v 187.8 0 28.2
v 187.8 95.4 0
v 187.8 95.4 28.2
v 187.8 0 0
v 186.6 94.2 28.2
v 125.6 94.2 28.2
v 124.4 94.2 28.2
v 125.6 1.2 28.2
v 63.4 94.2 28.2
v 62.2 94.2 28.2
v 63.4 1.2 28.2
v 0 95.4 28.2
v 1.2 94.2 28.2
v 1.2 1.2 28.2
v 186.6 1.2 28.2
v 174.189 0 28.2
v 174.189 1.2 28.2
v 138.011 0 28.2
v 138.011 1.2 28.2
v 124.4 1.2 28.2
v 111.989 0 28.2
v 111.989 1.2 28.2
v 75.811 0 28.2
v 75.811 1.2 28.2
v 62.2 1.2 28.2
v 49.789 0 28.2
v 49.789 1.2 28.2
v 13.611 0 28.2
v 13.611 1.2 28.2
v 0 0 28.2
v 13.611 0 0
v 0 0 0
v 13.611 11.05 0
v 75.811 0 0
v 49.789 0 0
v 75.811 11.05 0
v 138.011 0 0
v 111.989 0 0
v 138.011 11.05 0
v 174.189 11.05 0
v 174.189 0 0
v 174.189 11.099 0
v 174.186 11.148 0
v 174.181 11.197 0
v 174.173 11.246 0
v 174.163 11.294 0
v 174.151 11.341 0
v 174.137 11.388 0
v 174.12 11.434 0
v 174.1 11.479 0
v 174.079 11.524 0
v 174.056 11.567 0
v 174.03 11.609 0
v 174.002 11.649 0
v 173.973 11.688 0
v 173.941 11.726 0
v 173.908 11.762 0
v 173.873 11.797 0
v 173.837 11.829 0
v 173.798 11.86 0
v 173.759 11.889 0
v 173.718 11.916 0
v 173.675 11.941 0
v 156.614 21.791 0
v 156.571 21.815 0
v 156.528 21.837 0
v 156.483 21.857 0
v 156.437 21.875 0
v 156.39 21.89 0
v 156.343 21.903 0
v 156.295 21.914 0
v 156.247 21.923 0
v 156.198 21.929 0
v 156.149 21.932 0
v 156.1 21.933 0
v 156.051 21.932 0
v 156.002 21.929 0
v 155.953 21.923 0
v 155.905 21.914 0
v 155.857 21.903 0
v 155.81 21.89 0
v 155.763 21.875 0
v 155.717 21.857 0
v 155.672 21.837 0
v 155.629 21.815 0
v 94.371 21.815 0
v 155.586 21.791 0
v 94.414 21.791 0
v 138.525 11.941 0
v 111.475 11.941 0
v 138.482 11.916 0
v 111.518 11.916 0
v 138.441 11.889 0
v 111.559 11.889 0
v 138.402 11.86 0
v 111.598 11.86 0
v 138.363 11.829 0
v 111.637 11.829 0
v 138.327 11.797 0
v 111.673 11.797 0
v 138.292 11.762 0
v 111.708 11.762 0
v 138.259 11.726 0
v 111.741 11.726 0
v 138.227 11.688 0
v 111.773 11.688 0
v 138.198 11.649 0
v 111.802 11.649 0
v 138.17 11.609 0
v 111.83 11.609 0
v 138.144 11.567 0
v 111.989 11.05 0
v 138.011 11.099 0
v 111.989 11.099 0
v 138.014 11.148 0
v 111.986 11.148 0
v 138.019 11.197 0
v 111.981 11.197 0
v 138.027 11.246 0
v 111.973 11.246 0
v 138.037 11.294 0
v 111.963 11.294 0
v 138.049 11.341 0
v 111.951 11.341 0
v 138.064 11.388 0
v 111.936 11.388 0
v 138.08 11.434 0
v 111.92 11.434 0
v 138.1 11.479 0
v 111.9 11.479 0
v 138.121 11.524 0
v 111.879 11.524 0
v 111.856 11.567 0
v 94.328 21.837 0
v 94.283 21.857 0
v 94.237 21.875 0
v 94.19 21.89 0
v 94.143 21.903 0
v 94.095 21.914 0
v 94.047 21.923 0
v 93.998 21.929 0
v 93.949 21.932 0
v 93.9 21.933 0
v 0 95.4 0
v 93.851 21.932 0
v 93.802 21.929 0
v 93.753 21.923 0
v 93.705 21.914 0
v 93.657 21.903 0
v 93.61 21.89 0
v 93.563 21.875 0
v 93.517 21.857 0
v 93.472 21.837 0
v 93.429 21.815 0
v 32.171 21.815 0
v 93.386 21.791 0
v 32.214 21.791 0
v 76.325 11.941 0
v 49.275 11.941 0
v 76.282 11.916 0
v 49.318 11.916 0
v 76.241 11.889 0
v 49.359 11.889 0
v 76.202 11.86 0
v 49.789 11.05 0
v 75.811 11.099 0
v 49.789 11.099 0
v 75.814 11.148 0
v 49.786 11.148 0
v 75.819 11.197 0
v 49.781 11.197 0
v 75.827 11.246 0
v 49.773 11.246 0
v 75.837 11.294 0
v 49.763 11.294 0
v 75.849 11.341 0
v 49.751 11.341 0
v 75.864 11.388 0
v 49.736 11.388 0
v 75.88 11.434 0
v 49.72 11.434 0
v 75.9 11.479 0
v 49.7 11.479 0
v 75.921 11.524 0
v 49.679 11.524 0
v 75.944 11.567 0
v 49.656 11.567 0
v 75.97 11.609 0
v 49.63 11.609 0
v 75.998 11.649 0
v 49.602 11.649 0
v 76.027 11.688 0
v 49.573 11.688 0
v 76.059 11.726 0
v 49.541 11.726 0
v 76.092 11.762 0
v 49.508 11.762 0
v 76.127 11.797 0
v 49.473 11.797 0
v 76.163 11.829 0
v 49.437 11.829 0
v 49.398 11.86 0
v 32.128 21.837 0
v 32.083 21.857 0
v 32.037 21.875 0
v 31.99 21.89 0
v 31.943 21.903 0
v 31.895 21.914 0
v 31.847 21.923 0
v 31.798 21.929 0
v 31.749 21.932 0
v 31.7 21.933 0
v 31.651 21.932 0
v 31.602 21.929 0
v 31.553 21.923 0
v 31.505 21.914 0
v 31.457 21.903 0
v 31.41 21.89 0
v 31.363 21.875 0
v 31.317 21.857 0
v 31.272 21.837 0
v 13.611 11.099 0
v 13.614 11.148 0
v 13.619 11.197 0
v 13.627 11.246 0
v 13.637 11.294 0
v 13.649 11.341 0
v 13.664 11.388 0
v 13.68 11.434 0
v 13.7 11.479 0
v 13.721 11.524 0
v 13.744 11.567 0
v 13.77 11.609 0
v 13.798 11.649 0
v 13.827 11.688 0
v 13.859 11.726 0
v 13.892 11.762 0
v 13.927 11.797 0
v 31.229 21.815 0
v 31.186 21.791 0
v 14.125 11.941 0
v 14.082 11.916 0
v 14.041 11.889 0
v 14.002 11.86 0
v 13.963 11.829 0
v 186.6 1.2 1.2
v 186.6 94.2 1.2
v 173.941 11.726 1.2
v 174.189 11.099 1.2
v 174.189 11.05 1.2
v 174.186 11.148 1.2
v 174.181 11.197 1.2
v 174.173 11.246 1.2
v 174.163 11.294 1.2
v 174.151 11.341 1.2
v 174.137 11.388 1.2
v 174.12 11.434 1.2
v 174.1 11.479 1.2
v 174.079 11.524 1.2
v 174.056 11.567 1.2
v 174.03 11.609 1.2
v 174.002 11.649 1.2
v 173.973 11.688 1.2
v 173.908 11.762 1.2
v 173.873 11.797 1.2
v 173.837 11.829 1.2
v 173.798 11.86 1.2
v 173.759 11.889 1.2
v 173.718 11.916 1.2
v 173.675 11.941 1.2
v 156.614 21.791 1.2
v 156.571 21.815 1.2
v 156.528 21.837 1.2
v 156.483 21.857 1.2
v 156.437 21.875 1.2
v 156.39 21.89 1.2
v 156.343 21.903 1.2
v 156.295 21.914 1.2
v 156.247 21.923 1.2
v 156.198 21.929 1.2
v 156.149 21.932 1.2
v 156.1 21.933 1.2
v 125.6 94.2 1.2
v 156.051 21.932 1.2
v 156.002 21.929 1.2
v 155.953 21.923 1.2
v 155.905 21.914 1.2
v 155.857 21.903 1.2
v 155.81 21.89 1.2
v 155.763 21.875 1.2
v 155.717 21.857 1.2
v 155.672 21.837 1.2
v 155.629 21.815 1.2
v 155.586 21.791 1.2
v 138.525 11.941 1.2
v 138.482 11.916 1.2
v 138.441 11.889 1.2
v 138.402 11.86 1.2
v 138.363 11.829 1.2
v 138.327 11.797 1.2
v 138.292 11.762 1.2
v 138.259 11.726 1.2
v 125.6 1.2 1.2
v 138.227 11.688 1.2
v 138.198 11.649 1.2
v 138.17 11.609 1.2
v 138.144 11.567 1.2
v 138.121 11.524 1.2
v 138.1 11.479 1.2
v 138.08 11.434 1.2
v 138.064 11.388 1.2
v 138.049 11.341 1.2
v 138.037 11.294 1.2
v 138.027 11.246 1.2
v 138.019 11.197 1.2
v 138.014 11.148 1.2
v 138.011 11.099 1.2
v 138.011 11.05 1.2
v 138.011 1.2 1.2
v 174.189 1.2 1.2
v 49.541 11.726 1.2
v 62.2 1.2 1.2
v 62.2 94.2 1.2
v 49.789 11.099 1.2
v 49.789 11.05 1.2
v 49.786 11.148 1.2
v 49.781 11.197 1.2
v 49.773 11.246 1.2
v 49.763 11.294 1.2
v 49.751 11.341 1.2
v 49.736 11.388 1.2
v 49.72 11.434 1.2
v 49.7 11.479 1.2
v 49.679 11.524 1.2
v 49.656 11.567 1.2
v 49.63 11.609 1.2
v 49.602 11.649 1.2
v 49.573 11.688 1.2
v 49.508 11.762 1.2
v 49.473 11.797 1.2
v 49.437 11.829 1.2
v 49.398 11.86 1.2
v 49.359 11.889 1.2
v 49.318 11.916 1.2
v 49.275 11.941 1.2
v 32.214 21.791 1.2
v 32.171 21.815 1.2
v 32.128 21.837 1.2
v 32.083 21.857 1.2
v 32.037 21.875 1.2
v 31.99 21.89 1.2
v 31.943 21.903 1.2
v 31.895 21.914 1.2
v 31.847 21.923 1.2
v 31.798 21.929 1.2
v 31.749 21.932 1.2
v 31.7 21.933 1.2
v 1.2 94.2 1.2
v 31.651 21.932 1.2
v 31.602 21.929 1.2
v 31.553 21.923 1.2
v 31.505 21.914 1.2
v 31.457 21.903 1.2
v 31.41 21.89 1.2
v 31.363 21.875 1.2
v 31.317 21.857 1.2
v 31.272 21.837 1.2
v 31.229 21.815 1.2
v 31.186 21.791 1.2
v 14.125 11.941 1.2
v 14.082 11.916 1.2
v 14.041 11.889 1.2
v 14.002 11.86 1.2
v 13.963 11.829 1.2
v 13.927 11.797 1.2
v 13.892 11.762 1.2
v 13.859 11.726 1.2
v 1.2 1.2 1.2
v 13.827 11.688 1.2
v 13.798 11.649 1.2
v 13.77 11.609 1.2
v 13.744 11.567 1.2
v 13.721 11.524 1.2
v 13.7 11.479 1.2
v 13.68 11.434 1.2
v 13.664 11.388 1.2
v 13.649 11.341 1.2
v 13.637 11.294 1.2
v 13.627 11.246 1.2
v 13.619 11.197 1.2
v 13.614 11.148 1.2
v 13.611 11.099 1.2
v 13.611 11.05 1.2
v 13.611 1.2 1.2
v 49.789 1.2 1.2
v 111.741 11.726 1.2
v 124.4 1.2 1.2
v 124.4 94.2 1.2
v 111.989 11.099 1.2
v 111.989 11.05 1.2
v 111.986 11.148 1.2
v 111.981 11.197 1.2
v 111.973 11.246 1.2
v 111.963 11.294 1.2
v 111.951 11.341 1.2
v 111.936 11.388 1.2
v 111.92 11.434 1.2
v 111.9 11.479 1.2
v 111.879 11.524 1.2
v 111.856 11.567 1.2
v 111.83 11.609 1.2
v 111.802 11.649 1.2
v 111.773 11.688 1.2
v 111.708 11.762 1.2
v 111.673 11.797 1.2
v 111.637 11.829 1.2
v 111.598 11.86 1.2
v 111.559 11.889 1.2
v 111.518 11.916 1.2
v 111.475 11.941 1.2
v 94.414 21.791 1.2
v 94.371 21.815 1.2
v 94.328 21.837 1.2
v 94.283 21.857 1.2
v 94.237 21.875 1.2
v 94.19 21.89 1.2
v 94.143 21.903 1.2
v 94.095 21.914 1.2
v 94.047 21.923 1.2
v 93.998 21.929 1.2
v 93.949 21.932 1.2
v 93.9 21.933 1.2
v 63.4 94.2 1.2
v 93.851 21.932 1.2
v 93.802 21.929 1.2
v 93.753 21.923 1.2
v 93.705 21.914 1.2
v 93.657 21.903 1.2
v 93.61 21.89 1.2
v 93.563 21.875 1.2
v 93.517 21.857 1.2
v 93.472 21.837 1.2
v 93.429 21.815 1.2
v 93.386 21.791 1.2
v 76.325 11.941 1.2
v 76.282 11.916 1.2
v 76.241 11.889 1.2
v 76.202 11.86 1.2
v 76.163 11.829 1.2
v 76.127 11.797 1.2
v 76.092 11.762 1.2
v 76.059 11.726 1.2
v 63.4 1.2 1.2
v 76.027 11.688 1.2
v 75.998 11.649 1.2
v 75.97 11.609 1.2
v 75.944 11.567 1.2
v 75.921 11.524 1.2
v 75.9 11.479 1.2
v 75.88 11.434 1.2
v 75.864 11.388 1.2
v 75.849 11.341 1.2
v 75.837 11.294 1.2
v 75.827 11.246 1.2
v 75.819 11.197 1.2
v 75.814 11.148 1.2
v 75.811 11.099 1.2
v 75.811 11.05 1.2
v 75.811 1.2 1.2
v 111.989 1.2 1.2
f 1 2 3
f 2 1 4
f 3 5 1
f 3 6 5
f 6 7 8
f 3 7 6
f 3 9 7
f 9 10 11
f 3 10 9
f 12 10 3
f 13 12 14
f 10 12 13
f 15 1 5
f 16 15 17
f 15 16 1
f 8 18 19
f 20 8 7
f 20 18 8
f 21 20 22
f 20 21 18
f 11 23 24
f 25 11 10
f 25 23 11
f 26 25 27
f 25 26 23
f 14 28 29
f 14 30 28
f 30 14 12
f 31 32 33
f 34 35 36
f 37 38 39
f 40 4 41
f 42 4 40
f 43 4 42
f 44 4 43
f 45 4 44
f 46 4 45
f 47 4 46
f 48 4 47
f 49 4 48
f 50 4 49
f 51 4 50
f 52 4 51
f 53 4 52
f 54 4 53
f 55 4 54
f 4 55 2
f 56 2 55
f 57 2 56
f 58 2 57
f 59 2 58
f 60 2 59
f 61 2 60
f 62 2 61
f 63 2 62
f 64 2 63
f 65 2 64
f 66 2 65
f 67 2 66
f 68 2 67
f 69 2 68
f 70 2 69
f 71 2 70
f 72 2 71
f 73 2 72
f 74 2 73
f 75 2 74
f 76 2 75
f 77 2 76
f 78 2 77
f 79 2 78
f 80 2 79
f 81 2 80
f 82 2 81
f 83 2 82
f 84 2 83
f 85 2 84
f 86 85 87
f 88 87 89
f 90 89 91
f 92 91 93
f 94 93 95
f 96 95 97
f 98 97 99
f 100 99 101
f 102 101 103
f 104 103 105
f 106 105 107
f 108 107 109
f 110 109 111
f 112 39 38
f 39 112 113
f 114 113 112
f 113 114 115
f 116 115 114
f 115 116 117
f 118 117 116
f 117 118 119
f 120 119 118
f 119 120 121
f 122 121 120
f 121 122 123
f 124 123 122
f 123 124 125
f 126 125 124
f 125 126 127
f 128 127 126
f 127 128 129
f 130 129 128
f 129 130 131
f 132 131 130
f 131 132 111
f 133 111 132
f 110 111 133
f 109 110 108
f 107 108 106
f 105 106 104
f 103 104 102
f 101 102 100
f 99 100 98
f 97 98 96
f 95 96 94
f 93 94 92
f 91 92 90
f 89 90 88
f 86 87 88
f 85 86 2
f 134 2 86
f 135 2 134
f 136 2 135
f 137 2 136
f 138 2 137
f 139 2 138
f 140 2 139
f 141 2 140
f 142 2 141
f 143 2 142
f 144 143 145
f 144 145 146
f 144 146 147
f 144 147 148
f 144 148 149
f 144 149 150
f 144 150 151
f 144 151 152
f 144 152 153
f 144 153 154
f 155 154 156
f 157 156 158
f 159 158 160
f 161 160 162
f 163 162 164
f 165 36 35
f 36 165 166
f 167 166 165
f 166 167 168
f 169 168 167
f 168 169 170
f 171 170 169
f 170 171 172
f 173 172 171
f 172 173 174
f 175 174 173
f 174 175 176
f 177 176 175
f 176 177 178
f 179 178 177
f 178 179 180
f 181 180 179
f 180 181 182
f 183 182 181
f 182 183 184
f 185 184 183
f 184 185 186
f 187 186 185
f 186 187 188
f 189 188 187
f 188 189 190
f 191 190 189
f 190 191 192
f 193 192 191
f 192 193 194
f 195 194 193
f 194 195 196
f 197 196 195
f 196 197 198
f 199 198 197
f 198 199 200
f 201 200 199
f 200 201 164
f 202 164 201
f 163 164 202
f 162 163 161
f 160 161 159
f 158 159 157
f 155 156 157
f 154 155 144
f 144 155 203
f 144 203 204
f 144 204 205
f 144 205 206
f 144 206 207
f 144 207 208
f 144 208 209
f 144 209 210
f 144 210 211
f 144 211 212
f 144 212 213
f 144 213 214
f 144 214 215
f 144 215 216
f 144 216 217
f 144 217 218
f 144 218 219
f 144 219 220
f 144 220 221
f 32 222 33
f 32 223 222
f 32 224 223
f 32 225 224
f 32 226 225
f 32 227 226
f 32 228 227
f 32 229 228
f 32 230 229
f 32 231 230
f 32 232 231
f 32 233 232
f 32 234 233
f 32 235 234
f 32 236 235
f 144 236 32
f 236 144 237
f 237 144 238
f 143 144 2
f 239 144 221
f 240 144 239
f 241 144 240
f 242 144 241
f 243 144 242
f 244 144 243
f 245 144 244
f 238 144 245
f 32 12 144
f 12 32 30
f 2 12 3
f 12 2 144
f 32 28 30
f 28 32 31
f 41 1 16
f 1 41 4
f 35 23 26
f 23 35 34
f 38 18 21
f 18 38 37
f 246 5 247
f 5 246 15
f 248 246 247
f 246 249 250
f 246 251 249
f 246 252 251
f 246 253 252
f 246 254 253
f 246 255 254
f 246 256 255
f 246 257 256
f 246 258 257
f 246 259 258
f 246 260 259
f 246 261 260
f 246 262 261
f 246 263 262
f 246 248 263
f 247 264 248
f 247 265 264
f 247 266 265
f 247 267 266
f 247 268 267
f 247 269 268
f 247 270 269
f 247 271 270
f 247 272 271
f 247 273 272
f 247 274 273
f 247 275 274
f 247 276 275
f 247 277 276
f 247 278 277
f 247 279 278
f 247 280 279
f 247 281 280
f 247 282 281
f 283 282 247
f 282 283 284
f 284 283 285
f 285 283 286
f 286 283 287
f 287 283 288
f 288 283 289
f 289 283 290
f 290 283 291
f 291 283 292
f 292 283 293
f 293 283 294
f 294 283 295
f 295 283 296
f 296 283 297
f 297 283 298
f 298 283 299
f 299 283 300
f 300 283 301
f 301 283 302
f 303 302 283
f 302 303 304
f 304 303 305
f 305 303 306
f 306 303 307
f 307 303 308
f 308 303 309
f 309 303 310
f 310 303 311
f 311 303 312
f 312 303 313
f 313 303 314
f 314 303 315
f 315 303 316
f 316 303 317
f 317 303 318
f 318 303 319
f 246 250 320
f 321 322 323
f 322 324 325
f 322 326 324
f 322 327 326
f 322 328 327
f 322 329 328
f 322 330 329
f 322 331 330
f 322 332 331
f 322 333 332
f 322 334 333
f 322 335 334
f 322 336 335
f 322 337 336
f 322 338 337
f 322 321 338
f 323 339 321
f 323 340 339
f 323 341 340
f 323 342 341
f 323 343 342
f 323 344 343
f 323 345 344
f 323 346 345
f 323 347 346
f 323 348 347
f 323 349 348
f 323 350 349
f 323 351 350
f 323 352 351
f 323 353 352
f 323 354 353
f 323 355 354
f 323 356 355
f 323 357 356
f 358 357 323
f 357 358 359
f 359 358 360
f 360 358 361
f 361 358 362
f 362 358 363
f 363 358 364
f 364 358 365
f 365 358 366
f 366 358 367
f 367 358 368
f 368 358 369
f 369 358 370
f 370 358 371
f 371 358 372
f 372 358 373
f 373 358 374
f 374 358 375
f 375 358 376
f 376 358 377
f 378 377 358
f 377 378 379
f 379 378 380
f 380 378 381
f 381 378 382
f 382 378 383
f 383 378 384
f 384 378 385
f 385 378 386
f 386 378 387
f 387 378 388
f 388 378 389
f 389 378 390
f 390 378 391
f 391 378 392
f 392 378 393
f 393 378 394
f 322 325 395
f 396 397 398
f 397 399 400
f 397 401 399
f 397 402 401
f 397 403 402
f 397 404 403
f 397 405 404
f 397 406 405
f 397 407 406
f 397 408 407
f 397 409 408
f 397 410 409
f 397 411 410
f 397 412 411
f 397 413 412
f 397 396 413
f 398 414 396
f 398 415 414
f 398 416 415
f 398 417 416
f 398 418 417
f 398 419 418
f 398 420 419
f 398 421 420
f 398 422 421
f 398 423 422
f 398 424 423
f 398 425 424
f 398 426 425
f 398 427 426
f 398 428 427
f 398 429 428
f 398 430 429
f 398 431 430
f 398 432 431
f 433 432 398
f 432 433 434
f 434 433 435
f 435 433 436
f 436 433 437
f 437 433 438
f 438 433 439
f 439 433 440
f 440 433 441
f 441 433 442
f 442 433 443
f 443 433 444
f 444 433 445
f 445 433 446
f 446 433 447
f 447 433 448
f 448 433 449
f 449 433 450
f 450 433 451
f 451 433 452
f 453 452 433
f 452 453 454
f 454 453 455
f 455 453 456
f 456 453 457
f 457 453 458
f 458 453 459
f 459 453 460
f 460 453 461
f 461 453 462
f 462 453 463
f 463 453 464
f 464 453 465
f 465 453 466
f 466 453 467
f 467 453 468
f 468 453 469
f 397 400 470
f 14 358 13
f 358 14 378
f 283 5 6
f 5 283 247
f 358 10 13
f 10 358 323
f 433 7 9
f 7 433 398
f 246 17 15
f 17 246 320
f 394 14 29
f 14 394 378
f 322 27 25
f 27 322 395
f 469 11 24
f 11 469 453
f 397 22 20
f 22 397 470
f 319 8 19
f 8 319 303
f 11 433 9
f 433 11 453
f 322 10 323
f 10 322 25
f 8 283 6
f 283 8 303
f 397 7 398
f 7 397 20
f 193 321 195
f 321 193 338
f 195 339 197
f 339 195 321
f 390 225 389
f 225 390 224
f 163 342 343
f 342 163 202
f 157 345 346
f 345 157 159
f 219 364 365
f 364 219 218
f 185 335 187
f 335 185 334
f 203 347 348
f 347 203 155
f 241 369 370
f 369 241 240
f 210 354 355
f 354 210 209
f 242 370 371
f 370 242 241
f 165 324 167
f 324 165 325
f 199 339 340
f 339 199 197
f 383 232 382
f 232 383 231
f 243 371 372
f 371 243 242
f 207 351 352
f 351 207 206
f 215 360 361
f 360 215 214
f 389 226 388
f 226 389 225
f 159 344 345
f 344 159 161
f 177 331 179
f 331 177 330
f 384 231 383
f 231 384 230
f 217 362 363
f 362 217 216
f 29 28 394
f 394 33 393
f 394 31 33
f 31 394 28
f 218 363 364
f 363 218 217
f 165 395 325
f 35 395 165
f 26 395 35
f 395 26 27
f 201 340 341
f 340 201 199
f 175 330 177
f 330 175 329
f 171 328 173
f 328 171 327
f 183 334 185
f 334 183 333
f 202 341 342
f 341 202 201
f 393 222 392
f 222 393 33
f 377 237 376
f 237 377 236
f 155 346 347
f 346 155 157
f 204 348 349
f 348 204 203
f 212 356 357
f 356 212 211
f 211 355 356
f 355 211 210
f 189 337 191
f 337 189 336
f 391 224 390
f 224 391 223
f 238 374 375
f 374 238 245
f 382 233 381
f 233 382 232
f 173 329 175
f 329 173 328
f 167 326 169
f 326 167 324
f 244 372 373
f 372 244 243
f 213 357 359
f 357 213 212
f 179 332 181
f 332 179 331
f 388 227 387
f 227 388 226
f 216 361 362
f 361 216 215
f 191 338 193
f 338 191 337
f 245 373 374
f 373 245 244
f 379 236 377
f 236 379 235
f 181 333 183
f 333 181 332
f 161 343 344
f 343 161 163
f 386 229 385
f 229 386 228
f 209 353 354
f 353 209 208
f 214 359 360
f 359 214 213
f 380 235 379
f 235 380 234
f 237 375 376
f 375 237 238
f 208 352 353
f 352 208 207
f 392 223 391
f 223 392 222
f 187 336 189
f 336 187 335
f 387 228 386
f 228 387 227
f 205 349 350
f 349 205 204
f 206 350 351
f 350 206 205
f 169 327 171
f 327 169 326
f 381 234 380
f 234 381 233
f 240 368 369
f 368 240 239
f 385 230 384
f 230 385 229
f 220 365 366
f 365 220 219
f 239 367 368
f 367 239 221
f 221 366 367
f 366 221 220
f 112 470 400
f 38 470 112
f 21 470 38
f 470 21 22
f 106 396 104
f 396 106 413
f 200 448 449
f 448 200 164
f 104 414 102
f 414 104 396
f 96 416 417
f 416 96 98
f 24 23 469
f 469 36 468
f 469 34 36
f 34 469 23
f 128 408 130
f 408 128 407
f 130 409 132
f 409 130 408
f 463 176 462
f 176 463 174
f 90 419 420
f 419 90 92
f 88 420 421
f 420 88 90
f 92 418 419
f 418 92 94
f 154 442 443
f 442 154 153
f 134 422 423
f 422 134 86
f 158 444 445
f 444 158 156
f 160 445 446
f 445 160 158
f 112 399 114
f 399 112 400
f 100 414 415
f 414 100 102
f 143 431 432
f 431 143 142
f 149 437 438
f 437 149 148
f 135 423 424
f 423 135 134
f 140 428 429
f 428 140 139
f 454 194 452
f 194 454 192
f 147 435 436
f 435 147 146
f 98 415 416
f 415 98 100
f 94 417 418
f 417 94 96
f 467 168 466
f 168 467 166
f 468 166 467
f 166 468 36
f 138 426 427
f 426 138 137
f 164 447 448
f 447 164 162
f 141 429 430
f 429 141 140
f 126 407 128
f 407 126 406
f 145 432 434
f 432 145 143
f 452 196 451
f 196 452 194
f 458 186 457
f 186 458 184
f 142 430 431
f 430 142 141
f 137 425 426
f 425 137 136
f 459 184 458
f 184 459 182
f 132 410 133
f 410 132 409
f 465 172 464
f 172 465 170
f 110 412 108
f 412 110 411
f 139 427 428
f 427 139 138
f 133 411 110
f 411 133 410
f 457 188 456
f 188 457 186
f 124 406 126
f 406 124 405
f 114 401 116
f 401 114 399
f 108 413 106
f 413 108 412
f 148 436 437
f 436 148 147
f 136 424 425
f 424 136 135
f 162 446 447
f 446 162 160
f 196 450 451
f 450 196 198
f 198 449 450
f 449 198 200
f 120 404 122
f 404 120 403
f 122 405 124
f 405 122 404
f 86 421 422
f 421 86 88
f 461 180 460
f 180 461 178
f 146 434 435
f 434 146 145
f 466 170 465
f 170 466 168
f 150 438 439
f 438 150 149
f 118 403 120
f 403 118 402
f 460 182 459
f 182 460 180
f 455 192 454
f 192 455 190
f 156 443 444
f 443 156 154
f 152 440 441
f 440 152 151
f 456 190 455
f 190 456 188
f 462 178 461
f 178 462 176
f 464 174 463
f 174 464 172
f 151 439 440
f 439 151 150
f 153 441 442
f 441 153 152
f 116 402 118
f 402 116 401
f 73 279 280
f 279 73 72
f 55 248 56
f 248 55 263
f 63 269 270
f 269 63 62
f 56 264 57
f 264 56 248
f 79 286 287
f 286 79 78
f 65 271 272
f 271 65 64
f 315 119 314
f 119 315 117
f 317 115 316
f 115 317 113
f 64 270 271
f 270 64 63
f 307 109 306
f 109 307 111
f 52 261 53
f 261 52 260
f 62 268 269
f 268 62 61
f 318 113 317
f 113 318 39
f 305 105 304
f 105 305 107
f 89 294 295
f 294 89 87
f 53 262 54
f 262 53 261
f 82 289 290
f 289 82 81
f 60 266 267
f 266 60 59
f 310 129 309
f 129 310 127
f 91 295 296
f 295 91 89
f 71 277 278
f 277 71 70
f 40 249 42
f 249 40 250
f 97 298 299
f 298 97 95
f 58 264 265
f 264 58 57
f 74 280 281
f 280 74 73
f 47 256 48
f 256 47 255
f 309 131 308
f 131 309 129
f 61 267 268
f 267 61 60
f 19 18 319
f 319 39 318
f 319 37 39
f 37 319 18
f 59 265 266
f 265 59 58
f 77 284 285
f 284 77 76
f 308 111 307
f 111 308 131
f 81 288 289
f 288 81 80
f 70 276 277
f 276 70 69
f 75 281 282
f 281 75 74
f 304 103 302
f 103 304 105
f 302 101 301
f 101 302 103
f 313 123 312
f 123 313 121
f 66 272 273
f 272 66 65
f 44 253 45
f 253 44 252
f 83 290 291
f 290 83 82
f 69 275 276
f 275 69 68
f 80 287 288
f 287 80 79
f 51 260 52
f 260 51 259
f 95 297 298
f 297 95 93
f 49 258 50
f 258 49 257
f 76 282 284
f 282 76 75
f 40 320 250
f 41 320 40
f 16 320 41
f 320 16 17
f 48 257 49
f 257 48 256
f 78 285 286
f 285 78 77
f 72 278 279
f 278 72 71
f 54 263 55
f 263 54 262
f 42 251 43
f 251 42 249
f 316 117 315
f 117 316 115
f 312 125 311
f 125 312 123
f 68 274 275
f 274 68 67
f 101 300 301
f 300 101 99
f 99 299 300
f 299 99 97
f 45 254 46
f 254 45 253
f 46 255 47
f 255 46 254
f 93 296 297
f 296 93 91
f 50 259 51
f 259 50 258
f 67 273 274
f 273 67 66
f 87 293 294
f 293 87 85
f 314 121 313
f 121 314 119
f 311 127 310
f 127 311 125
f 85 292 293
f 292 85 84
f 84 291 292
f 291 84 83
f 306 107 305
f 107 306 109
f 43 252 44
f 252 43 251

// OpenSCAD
// file: ../../internal/tray.scad
// Copyright 2023 Joshua Star, All Rights Reserved

include <base.scad>
include <prim.scad>

module tray_basic(inner_size, r=0, thickness=DEFAULT_THICKNESS, bottom_thickness=undef) {

	half_z = inner_size.z / 2;
	radius = min(r, half_z);

	bottom_thk = bottom_thickness != undef ? bottom_thickness : thickness;

	thk2 = thickness * 2;

	outer_size = inner_size + [thk2, thk2, bottom_thk];
	echo("tray outer dimensions are: ", outer_size);

	inner_radius = radius - thickness;

	union() {
		difference() {
			// outer shell
			if (0 < r) {
				union() {
					translate([0, 0, bottom_thk])
						cylinder_cube([outer_size.x, outer_size.y, outer_size.z - bottom_thk], r=radius);
					cylinder_cube([outer_size.x, outer_size.y, bottom_thk], inner_radius, radius);
				}
			}
			else {
				cube(outer_size);
			}
			
			// lip cutout
			if (0 < radius) {
				translate([0, 0, inner_size.z + SMALL_NUM])
					cylinder_cube([outer_size.x, outer_size.y, bottom_thk], r1=inner_radius, r2=radius);
			}

			// inner cutout
			if (0 < radius) {
				translate([thickness, thickness, bottom_thk])
					rounded_cube(inner_size + [0, 0, bottom_thk], r=inner_radius, flat_top=true);
			}
			else {
				translate([thickness, thickness, bottom_thk])
						cube(inner_size + [0, 0, bottom_thk]);
			}
		}
	}
}

module tray_divided(size, r=0, div_x=1, div_y=1, thickness=DEFAULT_THICKNESS, bottom_thickness=undef, div_height=undef, div_thickness=undef) {

	bottom_thk = bottom_thickness != undef ? bottom_thickness : thickness;

	div_thk = div_thickness != undef ? div_thickness : thickness;
	div_z = div_height != undef ? div_height : size.z;

	max_div_z = 0 == r ? size.z : size.z - bottom_thk;
	clamped_div_z = min(div_z, max_div_z);

	x_minus_div = size.x - (div_thk * (div_x - 1));
	y_minus_div = size.y - (div_thk * (div_y - 1));

	x_off = (x_minus_div / div_x) + div_thk;
	y_off = (y_minus_div / div_y) + div_thk;
	
	union() {
		tray_basic(size, r=r, thickness=thickness, bottom_thickness=bottom_thk);

		// columns, along x
		for (i=[1:1:div_x-1]) {
			translate([i * x_off, thickness, bottom_thk])
				cube([div_thk, size.y, clamped_div_z]);
		}

		// rows, along y
		for (i=[1:1:div_y-1]) {
			translate([thickness, i * y_off, bottom_thk])
				cube([size.x, div_thk, clamped_div_z]);
		}
	}
}

module notch_cutter(h, r) {
	n = 6;
	rotate([0, 0, 180 / n]) cylinder_ngon(2 * r, h, n);
}

module tray_notched(size, div_x=1, div_y=1, thickness=DEFAULT_THICKNESS, bottom_thickness=undef, div_height=undef, div_thickness=undef, notch_lo_x=true, notch_hi_x=true) {

	bottom_thk = bottom_thickness != undef ? bottom_thickness : thickness;

	div_thk = div_thickness != undef ? div_thickness : thickness;
	div_z = div_height != undef ? div_height : size.z;

	x_minus_div = size.x - (div_thk * (div_x - 1));

	x_off = (x_minus_div / div_x) + div_thk;
	
	div_bias = (div_thk - x_off) / 2;

	notch_h = size.z + bottom_thk + 2 * SMALL_NUM;
	notch_r = x_off / 3;

	difference() {
		tray_divided(size, div_x=div_x, div_y=div_y, thickness=thickness, bottom_thickness=bottom_thk, div_height=div_z, div_thickness=div_thk);

		// notch along x
		for (i=[1:1:div_x]) {

			if (notch_lo_x) {
				translate([i * x_off + div_bias, thickness, -SMALL_NUM])
					notch_cutter(notch_h, notch_r);
			}

			if (notch_hi_x) {
				translate([i * x_off + div_bias, size.y + thickness, -SMALL_NUM])
					notch_cutter(notch_h, notch_r);
			}
		}
	}
}

// --- TESTING ---

//tray_basic([240, 120, 30], r=4);

//translate([-1.2, -1.2, 0]) tray_divided([200, 100, 5], div_x=20, div_y=10);
//tray_divided([180, 120, 30], r=15, div_x=3, div_y=2, div_height=25);

//translate([-1.2, -1.2, 0]) tray_notched([200, 100, 30], div_x=20, div_y=10);
// file: ../../internal/prim.scad
// Copyright 2023 Joshua Star, All Rights Reserved

module cylinder_cube(size, r1=1, r2=1, r=undef) {
	r1 = r != undef ? r : r1;
	r2 = r != undef ? r : r2;

	r_max = max(r1, r2);
	hull() {
		translate([r_max, r_max, 0])
			cylinder(size.z, r1, r2);
		translate([size.x - r_max, r_max, 0])
			cylinder(size.z, r1, r2);
		translate([r_max, size.y - r_max, 0])
			cylinder(size.z, r1, r2);
		translate([size.x - r_max, size.y - r_max, 0])
			cylinder(size.z, r1, r2);
	}
}

module cylinder_ngon(width, h, n=6, r=1) {
	hull() {
		for (i=[0:1:n-1]) {
			angl_off = 360 / n;
			posx_off = width / 2 - r;
			rotate([0, 0, i * angl_off]) translate([posx_off, 0, 0])
				cylinder(r=r, h=h);
		}
	}
}

module cylinder_trap(size, ratio, radius=1) {
	hull() {
		half_size_x = size.x / 2;
		translate([radius - half_size_x, radius, 0])
			cylinder(r=radius, h=size.z);
		translate([half_size_x - radius, radius, 0])
			cylinder(r=radius, h=size.z);
		translate([radius - ratio * half_size_x, size.y - radius, 0])
			cylinder(r=radius, h=size.z);
		translate([ratio * half_size_x - radius, size.y - radius, 0])
			cylinder(r=radius, h=size.z);
	}
}

module rounded_cube(size, r=1, flat_top=false) {
	
	half_z = size.z / 2;
	radius = min(r, half_z);
	
	hull() {
		// bottom 'points'
		translate([radius,radius,radius]) sphere(r=radius);
		translate([size.x-radius,radius,radius]) sphere(r=radius);
		translate([radius,size.y-radius,radius]) sphere(r=radius);
		translate([size.x-radius,size.y-radius,radius]) sphere(r=radius);

		// top 'points'
		pos_z = size.z - radius;
		if (flat_top) {
			translate([radius, radius, pos_z]) cylinder(r=radius, h=radius);
			translate([size.x-radius, radius, pos_z]) cylinder(r=radius, h=radius);
			translate([radius, size.y-radius, pos_z]) cylinder(r=radius, h=radius);
			translate([size.x-radius, size.y-radius, pos_z]) cylinder(r=radius, h=radius);
		}
		else {
			translate([radius, radius, pos_z]) sphere(r=radius);
			translate([size.x-radius, radius, pos_z]) sphere(r=radius);
			translate([radius, size.y-radius, pos_z]) sphere(r=radius);
			translate([size.x-radius, size.y-radius, pos_z]) sphere(r=radius);
		}
	}
}

// --- TESTING ---

//cylinder_cube([240, 120, 30], r=8);

//cylinder_cube([240, 120, 16], r1=4, r2=8);
//cylinder_cube([240, 120, 16], r1=8, r2=4);

//cylinder_ngon(10, 5, 7, 1);

//cylinder_trap([100, 50, 30], 0.5, radius=8);

//rounded_cube([240, 120, 30], r=12);
//rounded_cube([240, 120, 30], r=12, flat_top=true);
//rounded_cube([240, 120, 30], r=30, flat_top=true);
// file: ../../internal/math.scad
// Copyright 2023 Joshua Star, All Rights Reserved

function clamp(x, lower, upper) = x < lower ? lower : (upper < x ? upper : x);
function lerp(lower, upper, s) = (upper - lower) * s + lower;
// file: ../../internal/card.scad
// Copyright 2023 Joshua Star, All Rights Reserved

TOLERANCE_MIN = [0.4, 0.4];
TOLERANCE_MAX = [0.8, 0.8];

function std_card_dim() = [67, 93] + TOLERANCE_MIN; // gray
function amer_card_dim() = [59, 91] + TOLERANCE_MIN; // green
function euro_card_dim() = [62, 94] + TOLERANCE_MIN; // purple

function mini_amer_card_dim() = [44, 67] + TOLERANCE_MIN; // yellow
function mini_euro_card_dim() = [46, 71] + TOLERANCE_MIN; // ruby

function 7won_card_dim() = [67, 103] + TOLERANCE_MAX; // brown
function tarot_card_dim() = [73, 122] + TOLERANCE_MAX; // orange

function per_card_thickness() = 0.68;

function calc_card_stack(n, padding=1.2) = n * per_card_thickness() + padding;
function calc_card_count(d, padding=1.2) = (d - padding) / per_card_thickness();
// file: ../../internal/boxes.scad
// Copyright 2023 Joshua Star, All Rights Reserved

function gamebox_common() = [286, 286, 68]; // Terraforming Mars, Wingspan

function gamebox_ffg_10() = [254, 254, 48]; // Cave Troll, Drakon (4th ed), Elder Sign
function gamebox_ffg_11() = [290, 290, 70]; // 11.5 in.
function gamebox_ffg_revised_lcg() = [280, 238, 70]; // Marvel Champions
// file: ../../internal/base.scad
// Copyright 2023 Joshua Star, All Rights Reserved

fn = $preview ? 16 : 128;
$fn = fn;

SMALL_NUM = $preview ? 0.02 : 0.001;

DEFAULT_PADDING = 1.6;
DEFAULT_THICKNESS = 1.2;

function default_padding() = DEFAULT_PADDING;
function default_thickness() = DEFAULT_THICKNESS;

function make_list(v, n) = [for(i=[0:n-1]) v];
function sum_list(v) = [for(p=v) 1] * v;
// file: ../../boardgame_tk.scad
// Copyright 2023 Joshua Star, All Rights Reserved

include <internal/base.scad>
include <internal/boxes.scad>
include <internal/card.scad>
include <internal/math.scad>
include <internal/prim.scad>
include <internal/tray.scad>

module card_display(card_size, height, num_stacks, padding=DEFAULT_PADDING, thickness=DEFAULT_THICKNESS, bottom_thickness=undef, div_thickness=undef) {

	div_thk = div_thickness != undef ? div_thickness : thickness;

	dim_x = (card_size.x + padding) * num_stacks + (div_thk * (num_stacks - 1));
	dim_y = card_size.y + padding;
	dim_z = height;

	tray_notched([dim_x, dim_y, dim_z], div_x=num_stacks, thickness=thickness, bottom_thickness=bottom_thickness, div_thickness=div_thickness, notch_hi_x=false);
}

module vertical_cutter(size, r=0.5) {
	difference() {
		translate([0, size.z, 0]) rotate([90, 0, 0])
		linear_extrude(height=size.z) {
			translate([0, r, 0])
			offset(r=-r) {
				offset(r=2*r) {
					union() {
						translate([-(size.x + 2 * r) / 2, 0, 0]) square([size.x + 2 * r, 1]);
						translate([-(size.x - 2 * r)/2, -size.y, 0]) square([size.x - 2 * r, size.y]);
					}
				}
			}
		}

		translate([-(size.x + r), -size.z, 0])
			cube([2 * (size.x + r), 3 * size.z, 2 * (size.y + r)]);
	}
}

module card_tray(card_size, stacks, num_columns=1, padding=[0.8, 0.8, 0.8], thickness=DEFAULT_THICKNESS, bottom_thickness=undef, div_height=undef, div_thickness=undef) {

	bottom_thk = bottom_thickness != undef ? bottom_thickness : thickness;

	div_thk = div_thickness != undef ? div_thickness : thickness;

	col_dim_x = card_size.y + padding.x;

	dim_x = col_dim_x * num_columns + div_thk * (num_columns - 1);
	dim_y = sum_list(stacks) + (div_thk + padding.y) * (len(stacks) - 1);
	dim_z = card_size.x + padding.z;

	div_z = div_height != undef ? div_height : dim_z;

	min_card_dim = min(card_size.x, card_size.y);
	cutter_radius = min_card_dim / 6;

	difference() {
		union() {
			tray_divided([dim_x, dim_y, dim_z], div_x=num_columns, thickness=thickness, bottom_thickness=bottom_thickness);

			div_offsets = [
				for (a=0, b=stacks[0]; a < (len(stacks) - 1); a = a + 1, b = b + (stacks[a]==undef?0:stacks[a]) + padding.y + div_thk)
					b
				];

			// columns, along x
			for (c=[0:1:num_columns-1]) {
				// rows, along y
				for (y=div_offsets) {
					x_off = c * (col_dim_x + div_thk) + thickness;

					translate([x_off, y, bottom_thk])
						cube([col_dim_x, div_thk, div_z]);
				}
			}
		}

		cutout_size = [col_dim_x / 2, dim_z / 2, thickness + 2 * SMALL_NUM];
		cutout_z = bottom_thk + dim_z + SMALL_NUM;

		// cutout
		for (c=[0:1:num_columns-1]) {
			n = 8;

			x_off = c * (col_dim_x + div_thk) + (col_dim_x / 2) + thickness;

			// front cut
			translate([x_off, -SMALL_NUM, cutout_z])
					vertical_cutter(cutout_size, r=cutter_radius);
			
			// back cut
			translate([x_off, dim_y + thickness - SMALL_NUM, cutout_z])
					vertical_cutter(cutout_size, r=cutter_radius);
			
			// middle cut
			translate([x_off, thickness, bottom_thk + div_z + SMALL_NUM])
					vertical_cutter([cutout_size.x, div_z / 2, dim_y], r=cutter_radius);
		}
	}
}

module spacer(size, r=16, div_x=2, div_y=2, spacing=16) {
	difference() {
		cylinder_cube(size, r=r);

		half_spacing = spacing / 2;
		inner_radius = r - half_spacing;

		offset_x = size.x / div_x;
		offset_y = size.y / div_y;
		for (i=[0:1:div_x]) {
			for (j=[0:1:div_y]) {
				translate([i * offset_x + half_spacing, j * offset_y + half_spacing, -1])
				cylinder_cube([
					size.x / div_x - spacing,
					size.y / div_y - spacing,
					size.z + 2], r=inner_radius);
			}
		}
	}
}

module pegs_grid(rows=1, cols=1, radius=1, height=1, spacing=1, alt_pack=false) {
	x_start = spacing + radius;
	y_start = spacing + radius;

	x_alt_start = radius + spacing / 2;

	x_offset = 2 * radius + spacing;
	y_offset = alt_pack ? ((radius + spacing / 2) * sqrt(3)) : 2 * radius + spacing;

	for (r=[0:1:rows-1]) {
		is_alt = alt_pack ? (r % 2) : 0;
		for (c=[0:1:cols-(1 + is_alt)]) {
			translate([
					c * x_offset + x_start + x_alt_start * is_alt,
					r * y_offset + y_start,
					0])
				cylinder(h=height, r=radius);
		}
	}
}

module peg_board(rows=1, cols=1, radius=1, height=1, spacing=1) {
	difference() {
		cylinder_cube([
			cols * 2 * radius + (cols + 1) * spacing,
			rows * 2 * radius + (rows + 1) * spacing,
			height], r=radius);

		translate([0, 0, -height/2])
			pegs_grid(rows=rows, cols=cols, radius=radius, height=2*height, spacing=spacing, alt_pack=false);
	}
}

// --- TESTING ---

//card_display(mini_euro_card_dim(), 30, 3);

//vertical_cutter([100,50, 10], r=10);

//card_tray(std_card_dim(), [30, 30, 8, 8, 8, 16, 42], num_columns=4, div_height=55);

//spacer([240, 120, 10], r=16, div_x=4, div_y=3, spacing=8);

//pegs_grid(rows=4, cols=5, radius=32, height=4, spacing=6, alt_pack=false);
//pegs_grid(rows=4, cols=5, radius=32, height=4, spacing=6, alt_pack=true);

//peg_board(rows=3, cols=4, radius=28, height=4, spacing=6);
// main file
// Copyright 2023 Joshua Star, All Rights Reserved

use <../../boardgame_tk.scad>

dim_z = 27;
slots = 3;

card_display(amer_card_dim(), dim_z, slots);
